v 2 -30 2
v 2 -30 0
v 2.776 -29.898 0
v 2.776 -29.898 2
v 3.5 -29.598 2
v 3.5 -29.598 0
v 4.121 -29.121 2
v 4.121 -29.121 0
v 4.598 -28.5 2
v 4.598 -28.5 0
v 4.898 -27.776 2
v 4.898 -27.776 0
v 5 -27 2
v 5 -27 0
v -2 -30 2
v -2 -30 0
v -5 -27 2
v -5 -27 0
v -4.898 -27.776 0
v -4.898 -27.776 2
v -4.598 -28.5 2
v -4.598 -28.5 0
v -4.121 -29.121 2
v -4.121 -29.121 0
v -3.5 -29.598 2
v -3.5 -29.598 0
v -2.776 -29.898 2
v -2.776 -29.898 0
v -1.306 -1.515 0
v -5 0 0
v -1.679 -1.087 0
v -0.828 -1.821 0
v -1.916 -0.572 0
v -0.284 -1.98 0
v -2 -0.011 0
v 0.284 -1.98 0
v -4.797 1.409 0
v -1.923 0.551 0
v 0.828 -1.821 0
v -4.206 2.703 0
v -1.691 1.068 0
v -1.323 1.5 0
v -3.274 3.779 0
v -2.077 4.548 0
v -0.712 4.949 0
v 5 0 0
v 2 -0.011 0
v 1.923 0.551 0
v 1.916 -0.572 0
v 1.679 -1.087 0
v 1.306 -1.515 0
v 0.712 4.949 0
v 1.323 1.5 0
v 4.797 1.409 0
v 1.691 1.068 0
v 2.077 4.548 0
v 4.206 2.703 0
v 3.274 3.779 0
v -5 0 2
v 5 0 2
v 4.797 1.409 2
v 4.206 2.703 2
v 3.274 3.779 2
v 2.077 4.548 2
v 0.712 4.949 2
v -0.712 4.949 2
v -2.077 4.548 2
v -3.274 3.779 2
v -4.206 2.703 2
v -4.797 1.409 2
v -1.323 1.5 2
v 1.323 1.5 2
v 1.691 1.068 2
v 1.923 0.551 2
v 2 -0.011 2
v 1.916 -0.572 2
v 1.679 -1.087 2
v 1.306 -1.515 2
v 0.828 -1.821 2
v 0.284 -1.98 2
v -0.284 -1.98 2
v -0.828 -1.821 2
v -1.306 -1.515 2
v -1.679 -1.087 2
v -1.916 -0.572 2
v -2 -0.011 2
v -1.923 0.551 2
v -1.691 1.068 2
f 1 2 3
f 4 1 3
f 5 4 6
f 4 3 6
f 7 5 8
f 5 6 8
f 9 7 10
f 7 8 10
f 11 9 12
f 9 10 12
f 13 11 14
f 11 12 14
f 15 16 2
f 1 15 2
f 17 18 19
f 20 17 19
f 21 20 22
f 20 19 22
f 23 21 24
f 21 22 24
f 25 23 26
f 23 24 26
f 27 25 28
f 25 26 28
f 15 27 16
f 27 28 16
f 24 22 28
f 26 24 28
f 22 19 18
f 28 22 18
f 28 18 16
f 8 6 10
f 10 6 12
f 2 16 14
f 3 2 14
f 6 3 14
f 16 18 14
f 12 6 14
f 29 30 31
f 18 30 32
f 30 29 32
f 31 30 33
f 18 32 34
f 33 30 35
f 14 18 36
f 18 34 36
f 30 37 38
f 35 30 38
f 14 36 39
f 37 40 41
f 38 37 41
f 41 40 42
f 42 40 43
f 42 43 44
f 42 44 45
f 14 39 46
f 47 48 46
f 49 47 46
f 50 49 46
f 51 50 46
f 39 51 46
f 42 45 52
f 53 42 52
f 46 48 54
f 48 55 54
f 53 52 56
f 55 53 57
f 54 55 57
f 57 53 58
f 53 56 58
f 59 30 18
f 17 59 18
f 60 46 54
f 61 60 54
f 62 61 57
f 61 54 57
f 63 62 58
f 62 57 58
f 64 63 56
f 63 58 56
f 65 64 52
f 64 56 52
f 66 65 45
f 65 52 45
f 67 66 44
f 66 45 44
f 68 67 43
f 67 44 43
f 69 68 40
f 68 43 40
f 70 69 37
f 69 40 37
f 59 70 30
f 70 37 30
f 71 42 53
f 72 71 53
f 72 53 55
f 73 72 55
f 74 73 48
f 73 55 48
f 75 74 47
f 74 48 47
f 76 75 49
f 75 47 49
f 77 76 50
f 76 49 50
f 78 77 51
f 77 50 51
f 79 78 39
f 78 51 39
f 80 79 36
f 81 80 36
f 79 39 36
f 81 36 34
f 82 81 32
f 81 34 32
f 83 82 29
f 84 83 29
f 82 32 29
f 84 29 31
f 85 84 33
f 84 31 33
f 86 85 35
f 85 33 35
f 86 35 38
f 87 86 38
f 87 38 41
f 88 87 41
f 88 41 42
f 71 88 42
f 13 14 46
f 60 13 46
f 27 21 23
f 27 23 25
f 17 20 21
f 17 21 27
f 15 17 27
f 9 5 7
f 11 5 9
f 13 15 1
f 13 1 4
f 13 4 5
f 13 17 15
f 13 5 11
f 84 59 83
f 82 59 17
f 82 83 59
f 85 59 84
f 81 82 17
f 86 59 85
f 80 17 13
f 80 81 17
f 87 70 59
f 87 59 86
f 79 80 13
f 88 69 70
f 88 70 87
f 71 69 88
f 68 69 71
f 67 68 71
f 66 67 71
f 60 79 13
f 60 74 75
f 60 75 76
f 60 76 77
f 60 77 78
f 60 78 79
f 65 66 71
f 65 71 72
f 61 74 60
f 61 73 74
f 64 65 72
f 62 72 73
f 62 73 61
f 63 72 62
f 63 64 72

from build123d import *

# Parameters (mm, degrees)
BOSS_EXTRUDE1_DEPTH = 2


with BuildPart() as part:
    # Sketch1 → Boss-Extrude1 (new body)
    with BuildSketch(Plane.XY):
        with BuildLine():
            Line((-5, 0), (-5, -27))
            ThreePointArc((-5, -27), (-4.121320344, -29.121320344), (-2, -30))
            Line((-2, -30), (2, -30))
            ThreePointArc((2, -30), (4.121320344, -29.121320344), (5, -27))
            Line((5, -27), (5, 0))
            ThreePointArc((5, 0), (0, 5), (-5, 0))
        make_face()
        with BuildLine():
            Line((-1.322875656, 1.5), (1.322875656, 1.5))
            ThreePointArc((1.322875656, 1.5), (0, -2), (-1.322875656, 1.5))
        make_face(mode=Mode.SUBTRACT)
    extrude(amount=BOSS_EXTRUDE1_DEPTH)


solid = part.part
